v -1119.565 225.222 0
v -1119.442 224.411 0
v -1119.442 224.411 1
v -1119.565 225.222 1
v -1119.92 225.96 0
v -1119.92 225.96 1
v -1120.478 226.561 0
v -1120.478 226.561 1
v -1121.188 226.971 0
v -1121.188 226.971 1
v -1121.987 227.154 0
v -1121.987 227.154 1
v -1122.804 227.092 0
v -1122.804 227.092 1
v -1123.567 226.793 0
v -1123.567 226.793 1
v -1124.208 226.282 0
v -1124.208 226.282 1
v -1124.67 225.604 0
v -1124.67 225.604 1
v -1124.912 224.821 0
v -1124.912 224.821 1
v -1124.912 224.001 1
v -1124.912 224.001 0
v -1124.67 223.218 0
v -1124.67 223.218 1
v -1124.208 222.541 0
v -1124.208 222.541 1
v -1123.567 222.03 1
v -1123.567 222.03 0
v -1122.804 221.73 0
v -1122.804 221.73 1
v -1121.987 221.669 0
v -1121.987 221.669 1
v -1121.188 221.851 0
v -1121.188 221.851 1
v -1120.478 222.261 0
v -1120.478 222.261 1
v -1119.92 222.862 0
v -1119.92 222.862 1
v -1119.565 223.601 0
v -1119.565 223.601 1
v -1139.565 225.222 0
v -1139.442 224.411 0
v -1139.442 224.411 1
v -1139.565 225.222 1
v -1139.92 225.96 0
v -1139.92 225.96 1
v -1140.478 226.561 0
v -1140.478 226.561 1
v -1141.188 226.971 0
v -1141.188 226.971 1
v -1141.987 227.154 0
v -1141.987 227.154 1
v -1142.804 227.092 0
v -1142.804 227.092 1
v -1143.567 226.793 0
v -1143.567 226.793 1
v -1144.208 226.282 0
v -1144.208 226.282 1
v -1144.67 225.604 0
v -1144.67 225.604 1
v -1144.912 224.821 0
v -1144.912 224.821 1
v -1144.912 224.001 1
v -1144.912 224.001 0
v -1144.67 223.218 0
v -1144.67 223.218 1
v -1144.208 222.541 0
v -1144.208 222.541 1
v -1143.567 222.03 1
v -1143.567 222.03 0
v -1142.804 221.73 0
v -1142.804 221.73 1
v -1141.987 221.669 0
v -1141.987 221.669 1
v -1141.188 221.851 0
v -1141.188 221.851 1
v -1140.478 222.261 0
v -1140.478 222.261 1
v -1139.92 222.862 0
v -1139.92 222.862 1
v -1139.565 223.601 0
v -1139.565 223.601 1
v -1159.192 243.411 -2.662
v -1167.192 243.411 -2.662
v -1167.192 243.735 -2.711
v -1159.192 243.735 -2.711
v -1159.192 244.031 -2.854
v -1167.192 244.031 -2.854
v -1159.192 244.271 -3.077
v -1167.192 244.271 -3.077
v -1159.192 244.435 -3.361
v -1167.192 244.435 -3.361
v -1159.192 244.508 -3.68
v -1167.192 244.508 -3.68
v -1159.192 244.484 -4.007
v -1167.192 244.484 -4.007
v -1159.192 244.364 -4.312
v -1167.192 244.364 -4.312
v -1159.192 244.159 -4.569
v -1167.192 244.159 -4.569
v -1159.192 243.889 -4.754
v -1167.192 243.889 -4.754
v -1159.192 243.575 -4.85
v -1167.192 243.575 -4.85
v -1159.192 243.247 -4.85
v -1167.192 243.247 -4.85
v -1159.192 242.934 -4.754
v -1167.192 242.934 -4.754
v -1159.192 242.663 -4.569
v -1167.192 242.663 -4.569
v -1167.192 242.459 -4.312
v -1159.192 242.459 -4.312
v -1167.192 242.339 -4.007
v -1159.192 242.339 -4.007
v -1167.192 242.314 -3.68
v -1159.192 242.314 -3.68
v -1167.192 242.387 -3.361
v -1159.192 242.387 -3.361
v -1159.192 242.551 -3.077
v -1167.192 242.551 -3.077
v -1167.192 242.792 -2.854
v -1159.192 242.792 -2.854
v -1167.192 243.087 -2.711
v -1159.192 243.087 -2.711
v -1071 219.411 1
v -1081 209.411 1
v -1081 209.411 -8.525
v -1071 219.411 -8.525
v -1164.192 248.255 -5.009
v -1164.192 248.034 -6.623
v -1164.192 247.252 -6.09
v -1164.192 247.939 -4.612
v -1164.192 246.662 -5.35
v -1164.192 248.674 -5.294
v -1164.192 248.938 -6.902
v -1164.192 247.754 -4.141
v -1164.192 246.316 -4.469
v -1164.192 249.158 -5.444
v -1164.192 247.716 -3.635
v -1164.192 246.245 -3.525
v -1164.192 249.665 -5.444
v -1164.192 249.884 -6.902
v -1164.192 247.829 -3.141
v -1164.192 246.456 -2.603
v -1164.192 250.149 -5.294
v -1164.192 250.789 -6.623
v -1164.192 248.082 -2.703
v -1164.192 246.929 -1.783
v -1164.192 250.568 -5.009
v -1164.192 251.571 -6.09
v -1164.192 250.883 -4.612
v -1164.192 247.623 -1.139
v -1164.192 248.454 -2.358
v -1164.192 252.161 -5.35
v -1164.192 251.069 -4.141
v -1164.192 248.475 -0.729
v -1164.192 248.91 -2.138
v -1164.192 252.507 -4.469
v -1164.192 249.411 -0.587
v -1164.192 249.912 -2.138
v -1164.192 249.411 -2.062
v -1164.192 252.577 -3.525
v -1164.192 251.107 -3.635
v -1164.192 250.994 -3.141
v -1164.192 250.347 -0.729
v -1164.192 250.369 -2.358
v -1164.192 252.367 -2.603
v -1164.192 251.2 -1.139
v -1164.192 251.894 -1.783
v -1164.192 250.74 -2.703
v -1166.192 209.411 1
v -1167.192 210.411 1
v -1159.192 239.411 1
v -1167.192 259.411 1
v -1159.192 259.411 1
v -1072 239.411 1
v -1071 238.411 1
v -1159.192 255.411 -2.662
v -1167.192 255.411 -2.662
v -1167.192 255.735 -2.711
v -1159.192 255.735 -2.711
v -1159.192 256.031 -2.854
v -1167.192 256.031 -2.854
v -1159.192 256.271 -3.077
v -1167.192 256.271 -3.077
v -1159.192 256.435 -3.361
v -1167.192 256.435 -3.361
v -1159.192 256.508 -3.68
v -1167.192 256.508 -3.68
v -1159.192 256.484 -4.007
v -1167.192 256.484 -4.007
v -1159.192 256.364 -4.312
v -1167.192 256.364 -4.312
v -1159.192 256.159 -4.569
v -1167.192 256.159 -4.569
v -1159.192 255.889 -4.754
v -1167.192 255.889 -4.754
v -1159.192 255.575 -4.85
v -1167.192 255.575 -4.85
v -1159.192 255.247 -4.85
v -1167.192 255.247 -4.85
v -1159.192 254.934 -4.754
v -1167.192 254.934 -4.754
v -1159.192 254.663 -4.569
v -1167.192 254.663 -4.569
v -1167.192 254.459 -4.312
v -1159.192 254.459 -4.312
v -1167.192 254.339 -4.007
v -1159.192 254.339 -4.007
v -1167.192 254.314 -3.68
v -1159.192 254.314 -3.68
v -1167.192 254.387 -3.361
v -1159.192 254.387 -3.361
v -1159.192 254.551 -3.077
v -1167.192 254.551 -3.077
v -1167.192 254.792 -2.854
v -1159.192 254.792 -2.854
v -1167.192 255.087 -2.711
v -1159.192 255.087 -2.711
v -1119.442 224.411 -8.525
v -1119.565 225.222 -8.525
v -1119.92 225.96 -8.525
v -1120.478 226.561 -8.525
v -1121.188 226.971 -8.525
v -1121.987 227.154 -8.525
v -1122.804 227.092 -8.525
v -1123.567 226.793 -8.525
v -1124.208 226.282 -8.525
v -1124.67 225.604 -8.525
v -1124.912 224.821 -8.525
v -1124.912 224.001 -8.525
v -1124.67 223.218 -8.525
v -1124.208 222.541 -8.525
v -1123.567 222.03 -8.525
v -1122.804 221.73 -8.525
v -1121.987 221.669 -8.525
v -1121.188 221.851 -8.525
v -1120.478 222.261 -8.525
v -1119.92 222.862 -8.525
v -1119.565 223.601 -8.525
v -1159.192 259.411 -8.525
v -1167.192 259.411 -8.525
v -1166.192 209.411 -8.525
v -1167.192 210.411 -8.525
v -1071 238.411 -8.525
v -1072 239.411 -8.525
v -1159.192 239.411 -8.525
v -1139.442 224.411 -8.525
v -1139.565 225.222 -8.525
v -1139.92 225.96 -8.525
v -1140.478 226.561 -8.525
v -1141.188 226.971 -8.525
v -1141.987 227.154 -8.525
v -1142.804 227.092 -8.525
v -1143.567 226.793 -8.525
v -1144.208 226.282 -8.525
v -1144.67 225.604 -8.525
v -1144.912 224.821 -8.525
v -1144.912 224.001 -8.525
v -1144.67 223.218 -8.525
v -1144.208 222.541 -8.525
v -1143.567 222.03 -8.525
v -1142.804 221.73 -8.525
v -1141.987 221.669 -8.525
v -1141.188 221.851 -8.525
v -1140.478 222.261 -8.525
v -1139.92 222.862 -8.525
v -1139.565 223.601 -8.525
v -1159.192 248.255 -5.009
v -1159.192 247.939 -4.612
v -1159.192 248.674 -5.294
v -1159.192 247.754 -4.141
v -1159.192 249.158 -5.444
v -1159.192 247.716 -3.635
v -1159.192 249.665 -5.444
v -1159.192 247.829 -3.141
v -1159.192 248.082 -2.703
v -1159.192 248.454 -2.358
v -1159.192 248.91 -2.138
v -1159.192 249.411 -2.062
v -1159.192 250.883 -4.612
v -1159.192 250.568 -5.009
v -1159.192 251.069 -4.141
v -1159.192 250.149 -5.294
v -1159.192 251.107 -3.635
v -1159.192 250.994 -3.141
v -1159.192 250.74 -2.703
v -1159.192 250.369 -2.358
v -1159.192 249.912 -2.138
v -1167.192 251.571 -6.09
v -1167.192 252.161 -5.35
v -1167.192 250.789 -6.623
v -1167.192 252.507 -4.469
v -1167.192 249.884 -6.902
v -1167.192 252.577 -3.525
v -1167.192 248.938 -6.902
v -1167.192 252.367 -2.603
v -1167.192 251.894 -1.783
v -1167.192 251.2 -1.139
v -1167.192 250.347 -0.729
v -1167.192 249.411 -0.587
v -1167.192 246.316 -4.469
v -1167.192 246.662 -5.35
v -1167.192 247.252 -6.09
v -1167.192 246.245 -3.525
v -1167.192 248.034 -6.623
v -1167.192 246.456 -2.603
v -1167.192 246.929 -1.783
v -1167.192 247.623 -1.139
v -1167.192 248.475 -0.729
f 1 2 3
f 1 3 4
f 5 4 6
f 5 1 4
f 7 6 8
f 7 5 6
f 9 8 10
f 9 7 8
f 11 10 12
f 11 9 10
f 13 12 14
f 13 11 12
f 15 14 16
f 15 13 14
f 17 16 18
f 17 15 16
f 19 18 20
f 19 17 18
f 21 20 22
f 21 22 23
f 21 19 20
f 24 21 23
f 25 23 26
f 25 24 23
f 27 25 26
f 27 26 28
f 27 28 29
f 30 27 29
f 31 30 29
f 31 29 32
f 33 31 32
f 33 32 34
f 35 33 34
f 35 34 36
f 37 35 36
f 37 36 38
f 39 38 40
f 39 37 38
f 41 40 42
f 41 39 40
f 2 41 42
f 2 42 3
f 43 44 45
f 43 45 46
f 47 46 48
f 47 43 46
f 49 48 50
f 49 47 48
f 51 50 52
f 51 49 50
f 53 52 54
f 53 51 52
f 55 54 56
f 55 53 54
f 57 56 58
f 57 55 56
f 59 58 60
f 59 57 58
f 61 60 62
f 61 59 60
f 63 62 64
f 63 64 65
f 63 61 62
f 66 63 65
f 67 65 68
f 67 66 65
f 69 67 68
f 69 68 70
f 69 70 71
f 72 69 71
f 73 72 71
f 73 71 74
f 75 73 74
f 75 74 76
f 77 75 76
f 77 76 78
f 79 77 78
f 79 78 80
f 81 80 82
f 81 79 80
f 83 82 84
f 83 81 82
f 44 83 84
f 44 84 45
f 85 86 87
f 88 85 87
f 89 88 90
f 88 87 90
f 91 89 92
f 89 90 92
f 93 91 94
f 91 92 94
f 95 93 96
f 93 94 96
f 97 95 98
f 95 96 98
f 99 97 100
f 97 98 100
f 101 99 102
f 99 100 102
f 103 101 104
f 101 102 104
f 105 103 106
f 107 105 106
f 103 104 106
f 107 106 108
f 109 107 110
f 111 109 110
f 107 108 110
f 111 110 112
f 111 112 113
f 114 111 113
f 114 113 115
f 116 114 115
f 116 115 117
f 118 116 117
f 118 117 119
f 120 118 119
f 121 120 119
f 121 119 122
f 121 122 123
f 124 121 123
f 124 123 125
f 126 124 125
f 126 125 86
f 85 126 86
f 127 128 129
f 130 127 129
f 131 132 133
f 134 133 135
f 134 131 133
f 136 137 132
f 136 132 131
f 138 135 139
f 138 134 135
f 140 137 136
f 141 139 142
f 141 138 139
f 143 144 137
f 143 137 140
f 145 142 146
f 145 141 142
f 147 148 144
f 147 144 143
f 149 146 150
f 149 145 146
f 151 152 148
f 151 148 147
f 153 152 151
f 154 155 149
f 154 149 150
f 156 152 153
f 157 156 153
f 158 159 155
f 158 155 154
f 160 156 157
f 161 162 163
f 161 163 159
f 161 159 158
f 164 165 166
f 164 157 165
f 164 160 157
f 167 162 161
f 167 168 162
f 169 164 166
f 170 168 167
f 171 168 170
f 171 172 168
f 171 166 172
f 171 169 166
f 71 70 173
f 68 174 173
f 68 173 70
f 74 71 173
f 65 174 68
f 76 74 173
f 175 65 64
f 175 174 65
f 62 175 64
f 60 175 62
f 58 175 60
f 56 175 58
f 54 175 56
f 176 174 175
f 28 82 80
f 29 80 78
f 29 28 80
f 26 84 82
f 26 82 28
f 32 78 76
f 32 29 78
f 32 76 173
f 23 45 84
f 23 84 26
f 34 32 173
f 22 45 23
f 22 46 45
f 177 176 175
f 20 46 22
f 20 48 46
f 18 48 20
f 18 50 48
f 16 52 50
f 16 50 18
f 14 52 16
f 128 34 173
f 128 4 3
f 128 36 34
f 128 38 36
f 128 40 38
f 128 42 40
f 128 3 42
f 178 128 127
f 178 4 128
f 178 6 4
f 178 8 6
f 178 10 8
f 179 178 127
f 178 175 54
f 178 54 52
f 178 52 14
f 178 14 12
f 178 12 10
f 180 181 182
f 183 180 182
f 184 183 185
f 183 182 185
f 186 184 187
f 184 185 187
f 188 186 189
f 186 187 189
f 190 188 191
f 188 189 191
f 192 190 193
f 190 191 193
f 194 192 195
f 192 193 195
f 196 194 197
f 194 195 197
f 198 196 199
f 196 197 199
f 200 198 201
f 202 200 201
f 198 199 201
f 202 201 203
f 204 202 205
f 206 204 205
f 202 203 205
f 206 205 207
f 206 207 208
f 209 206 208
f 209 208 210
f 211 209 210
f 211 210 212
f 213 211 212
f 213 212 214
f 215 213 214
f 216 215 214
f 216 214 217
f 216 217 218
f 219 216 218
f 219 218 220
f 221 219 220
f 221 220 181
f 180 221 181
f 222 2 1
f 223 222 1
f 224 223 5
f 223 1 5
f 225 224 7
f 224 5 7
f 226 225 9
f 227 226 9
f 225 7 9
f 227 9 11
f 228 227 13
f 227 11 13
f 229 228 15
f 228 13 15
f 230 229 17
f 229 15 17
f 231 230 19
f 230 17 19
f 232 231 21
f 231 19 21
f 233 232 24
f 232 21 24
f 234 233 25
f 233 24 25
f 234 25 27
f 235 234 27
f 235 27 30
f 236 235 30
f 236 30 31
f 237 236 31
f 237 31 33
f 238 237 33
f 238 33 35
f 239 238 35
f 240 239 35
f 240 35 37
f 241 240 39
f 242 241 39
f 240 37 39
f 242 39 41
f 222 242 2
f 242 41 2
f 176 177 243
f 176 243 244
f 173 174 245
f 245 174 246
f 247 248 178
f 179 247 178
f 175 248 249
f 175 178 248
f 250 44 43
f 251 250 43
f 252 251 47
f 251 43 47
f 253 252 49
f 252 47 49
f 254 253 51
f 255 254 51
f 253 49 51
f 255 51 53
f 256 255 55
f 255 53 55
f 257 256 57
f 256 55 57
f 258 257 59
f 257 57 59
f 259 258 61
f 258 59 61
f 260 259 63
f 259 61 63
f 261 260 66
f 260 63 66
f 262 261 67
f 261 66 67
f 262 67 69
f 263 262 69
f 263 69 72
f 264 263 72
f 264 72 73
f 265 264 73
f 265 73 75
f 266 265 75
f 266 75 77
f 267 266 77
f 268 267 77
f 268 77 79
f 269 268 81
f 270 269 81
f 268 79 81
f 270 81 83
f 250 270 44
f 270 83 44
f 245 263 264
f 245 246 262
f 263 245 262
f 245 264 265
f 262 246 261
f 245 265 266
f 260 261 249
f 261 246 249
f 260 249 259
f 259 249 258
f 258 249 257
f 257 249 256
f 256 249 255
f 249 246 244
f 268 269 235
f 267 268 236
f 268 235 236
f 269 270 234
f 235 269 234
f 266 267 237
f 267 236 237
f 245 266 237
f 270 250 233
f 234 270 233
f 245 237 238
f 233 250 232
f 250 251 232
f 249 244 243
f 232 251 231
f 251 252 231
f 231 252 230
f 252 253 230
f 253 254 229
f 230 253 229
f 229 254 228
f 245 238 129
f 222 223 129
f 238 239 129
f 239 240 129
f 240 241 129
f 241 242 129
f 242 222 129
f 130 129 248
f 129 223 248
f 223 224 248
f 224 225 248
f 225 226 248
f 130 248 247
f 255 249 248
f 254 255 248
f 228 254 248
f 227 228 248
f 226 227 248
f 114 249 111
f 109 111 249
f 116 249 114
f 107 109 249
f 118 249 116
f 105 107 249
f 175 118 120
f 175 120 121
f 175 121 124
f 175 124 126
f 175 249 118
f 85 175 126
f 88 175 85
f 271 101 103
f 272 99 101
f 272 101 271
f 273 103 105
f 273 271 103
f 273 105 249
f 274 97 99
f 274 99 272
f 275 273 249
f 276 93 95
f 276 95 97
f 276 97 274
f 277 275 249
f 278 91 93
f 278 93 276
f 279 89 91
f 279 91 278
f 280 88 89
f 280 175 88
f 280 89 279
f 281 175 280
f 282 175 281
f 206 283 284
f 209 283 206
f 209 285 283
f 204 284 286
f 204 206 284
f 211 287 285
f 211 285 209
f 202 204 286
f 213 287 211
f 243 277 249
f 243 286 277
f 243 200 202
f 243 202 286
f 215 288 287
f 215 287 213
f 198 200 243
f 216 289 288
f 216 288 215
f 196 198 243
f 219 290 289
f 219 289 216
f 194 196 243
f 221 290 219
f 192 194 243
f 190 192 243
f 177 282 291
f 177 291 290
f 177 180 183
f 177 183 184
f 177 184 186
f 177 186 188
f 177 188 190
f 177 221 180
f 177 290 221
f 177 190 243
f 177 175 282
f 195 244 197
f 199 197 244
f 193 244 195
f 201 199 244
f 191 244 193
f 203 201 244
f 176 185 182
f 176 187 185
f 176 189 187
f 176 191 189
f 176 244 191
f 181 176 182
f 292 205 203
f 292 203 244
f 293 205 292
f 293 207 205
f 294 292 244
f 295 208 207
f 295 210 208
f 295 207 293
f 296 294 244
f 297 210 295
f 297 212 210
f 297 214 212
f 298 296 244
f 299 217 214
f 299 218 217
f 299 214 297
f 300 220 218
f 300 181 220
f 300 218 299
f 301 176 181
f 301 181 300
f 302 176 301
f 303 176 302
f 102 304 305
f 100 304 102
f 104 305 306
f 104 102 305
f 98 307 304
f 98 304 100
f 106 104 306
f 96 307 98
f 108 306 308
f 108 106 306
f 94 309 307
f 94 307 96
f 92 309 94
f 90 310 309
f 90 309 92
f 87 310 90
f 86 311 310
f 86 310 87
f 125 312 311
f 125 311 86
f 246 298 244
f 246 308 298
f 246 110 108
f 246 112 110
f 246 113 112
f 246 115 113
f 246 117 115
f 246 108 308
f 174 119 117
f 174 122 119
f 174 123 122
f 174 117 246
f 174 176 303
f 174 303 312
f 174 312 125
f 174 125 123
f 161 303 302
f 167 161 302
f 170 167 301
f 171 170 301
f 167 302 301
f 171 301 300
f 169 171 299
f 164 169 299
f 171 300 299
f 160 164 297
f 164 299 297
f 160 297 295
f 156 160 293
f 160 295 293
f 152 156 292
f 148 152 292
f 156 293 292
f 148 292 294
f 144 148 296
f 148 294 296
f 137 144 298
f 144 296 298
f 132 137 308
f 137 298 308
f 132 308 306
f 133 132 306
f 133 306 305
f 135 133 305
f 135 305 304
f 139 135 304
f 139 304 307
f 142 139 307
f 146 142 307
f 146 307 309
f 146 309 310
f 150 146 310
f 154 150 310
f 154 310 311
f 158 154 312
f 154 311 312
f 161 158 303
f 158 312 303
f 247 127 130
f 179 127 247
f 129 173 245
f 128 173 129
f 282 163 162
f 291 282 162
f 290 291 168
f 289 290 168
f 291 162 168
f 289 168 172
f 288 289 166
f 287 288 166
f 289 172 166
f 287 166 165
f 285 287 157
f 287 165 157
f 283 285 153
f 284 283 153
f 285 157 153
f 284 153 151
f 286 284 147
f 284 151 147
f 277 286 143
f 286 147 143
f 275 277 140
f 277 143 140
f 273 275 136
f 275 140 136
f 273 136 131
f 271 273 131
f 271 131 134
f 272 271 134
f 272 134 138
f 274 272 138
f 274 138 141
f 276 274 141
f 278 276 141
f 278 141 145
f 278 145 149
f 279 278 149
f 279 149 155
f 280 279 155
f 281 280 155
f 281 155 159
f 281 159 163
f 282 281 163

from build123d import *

# Parameters (mm, degrees)
SKETCH1_R                = 2.75
BOSS_EXTRUDE1_DEPTH      = 1
BOSS_EXTRUDE1_DEPTH_BACK = 8.525
CHAMFER1_SIZE            = 10
CHAMFER2_SIZE            = 1
SKETCH2_R                = 1.7
CUT_EXTRUDE1_DEPTH       = 97.192388155
SKETCH3_R                = 1.1
CUT_EXTRUDE2_DEPTH       = 97.192388155
SKETCH4_R                = 3.175
CUT_EXTRUDE3_DEPTH       = 3


with BuildPart() as part:
    # Sketch1 → Boss-Extrude1 (new body, two sides)
    with BuildSketch(Plane.XY) as boss_extrude1_sk:
        Polygon((-1071, 209.41125497), (-1071, 239.41125497), (-1159.192388155, 239.41125497), (-1159.192388155, 259.41125497), (-1167.192388155, 259.41125497), (-1167.192388155, 209.41125497), align=None)
        with Locations((-1122.192388155, 224.41125497)):
            Circle(SKETCH1_R, mode=Mode.SUBTRACT)
        with Locations((-1142.192388155, 224.41125497)):
            Circle(SKETCH1_R, mode=Mode.SUBTRACT)
    extrude(amount=BOSS_EXTRUDE1_DEPTH)
    extrude(boss_extrude1_sk.sketch, amount=-BOSS_EXTRUDE1_DEPTH_BACK)

    # Chamfer1
    chamfer1_edges = [part.edges().sort_by_distance(p)[0] for p in [
        (-1071, 209.41125497, -3.7625),
    ]]
    chamfer(chamfer1_edges, length=CHAMFER1_SIZE)

    # Chamfer2
    chamfer2_edges = [part.edges().sort_by_distance(p)[0] for p in [
        (-1167.192388155, 209.41125497, -3.7625),
        (-1071, 239.41125497, -3.7625),
    ]]
    chamfer(chamfer2_edges, length=CHAMFER2_SIZE)

    # Sketch2 → Cut-Extrude1 (cut, through all)
    with BuildSketch(Plane.ZY.offset(1167.192388155)):
        with Locations((-3.762499999, 249.41125497)):
            Circle(SKETCH2_R)
    extrude(amount=-CUT_EXTRUDE1_DEPTH, mode=Mode.SUBTRACT)

    # Sketch3 → Cut-Extrude2 (cut, through all)
    with BuildSketch(Plane.ZY.offset(1167.192388155)):
        with Locations((-3.762499999, 255.41125497)):
            Circle(SKETCH3_R)
        with Locations((-3.762499999, 243.41125497)):
            Circle(SKETCH3_R)
    extrude(amount=-CUT_EXTRUDE2_DEPTH, mode=Mode.SUBTRACT)

    # Sketch4 → Cut-Extrude3 (cut)
    with BuildSketch(Plane.ZY.offset(1167.192388155)):
        with Locations((-3.762499999, 249.41125497)):
            Circle(SKETCH4_R)
    extrude(amount=-CUT_EXTRUDE3_DEPTH, mode=Mode.SUBTRACT)


solid = part.part
